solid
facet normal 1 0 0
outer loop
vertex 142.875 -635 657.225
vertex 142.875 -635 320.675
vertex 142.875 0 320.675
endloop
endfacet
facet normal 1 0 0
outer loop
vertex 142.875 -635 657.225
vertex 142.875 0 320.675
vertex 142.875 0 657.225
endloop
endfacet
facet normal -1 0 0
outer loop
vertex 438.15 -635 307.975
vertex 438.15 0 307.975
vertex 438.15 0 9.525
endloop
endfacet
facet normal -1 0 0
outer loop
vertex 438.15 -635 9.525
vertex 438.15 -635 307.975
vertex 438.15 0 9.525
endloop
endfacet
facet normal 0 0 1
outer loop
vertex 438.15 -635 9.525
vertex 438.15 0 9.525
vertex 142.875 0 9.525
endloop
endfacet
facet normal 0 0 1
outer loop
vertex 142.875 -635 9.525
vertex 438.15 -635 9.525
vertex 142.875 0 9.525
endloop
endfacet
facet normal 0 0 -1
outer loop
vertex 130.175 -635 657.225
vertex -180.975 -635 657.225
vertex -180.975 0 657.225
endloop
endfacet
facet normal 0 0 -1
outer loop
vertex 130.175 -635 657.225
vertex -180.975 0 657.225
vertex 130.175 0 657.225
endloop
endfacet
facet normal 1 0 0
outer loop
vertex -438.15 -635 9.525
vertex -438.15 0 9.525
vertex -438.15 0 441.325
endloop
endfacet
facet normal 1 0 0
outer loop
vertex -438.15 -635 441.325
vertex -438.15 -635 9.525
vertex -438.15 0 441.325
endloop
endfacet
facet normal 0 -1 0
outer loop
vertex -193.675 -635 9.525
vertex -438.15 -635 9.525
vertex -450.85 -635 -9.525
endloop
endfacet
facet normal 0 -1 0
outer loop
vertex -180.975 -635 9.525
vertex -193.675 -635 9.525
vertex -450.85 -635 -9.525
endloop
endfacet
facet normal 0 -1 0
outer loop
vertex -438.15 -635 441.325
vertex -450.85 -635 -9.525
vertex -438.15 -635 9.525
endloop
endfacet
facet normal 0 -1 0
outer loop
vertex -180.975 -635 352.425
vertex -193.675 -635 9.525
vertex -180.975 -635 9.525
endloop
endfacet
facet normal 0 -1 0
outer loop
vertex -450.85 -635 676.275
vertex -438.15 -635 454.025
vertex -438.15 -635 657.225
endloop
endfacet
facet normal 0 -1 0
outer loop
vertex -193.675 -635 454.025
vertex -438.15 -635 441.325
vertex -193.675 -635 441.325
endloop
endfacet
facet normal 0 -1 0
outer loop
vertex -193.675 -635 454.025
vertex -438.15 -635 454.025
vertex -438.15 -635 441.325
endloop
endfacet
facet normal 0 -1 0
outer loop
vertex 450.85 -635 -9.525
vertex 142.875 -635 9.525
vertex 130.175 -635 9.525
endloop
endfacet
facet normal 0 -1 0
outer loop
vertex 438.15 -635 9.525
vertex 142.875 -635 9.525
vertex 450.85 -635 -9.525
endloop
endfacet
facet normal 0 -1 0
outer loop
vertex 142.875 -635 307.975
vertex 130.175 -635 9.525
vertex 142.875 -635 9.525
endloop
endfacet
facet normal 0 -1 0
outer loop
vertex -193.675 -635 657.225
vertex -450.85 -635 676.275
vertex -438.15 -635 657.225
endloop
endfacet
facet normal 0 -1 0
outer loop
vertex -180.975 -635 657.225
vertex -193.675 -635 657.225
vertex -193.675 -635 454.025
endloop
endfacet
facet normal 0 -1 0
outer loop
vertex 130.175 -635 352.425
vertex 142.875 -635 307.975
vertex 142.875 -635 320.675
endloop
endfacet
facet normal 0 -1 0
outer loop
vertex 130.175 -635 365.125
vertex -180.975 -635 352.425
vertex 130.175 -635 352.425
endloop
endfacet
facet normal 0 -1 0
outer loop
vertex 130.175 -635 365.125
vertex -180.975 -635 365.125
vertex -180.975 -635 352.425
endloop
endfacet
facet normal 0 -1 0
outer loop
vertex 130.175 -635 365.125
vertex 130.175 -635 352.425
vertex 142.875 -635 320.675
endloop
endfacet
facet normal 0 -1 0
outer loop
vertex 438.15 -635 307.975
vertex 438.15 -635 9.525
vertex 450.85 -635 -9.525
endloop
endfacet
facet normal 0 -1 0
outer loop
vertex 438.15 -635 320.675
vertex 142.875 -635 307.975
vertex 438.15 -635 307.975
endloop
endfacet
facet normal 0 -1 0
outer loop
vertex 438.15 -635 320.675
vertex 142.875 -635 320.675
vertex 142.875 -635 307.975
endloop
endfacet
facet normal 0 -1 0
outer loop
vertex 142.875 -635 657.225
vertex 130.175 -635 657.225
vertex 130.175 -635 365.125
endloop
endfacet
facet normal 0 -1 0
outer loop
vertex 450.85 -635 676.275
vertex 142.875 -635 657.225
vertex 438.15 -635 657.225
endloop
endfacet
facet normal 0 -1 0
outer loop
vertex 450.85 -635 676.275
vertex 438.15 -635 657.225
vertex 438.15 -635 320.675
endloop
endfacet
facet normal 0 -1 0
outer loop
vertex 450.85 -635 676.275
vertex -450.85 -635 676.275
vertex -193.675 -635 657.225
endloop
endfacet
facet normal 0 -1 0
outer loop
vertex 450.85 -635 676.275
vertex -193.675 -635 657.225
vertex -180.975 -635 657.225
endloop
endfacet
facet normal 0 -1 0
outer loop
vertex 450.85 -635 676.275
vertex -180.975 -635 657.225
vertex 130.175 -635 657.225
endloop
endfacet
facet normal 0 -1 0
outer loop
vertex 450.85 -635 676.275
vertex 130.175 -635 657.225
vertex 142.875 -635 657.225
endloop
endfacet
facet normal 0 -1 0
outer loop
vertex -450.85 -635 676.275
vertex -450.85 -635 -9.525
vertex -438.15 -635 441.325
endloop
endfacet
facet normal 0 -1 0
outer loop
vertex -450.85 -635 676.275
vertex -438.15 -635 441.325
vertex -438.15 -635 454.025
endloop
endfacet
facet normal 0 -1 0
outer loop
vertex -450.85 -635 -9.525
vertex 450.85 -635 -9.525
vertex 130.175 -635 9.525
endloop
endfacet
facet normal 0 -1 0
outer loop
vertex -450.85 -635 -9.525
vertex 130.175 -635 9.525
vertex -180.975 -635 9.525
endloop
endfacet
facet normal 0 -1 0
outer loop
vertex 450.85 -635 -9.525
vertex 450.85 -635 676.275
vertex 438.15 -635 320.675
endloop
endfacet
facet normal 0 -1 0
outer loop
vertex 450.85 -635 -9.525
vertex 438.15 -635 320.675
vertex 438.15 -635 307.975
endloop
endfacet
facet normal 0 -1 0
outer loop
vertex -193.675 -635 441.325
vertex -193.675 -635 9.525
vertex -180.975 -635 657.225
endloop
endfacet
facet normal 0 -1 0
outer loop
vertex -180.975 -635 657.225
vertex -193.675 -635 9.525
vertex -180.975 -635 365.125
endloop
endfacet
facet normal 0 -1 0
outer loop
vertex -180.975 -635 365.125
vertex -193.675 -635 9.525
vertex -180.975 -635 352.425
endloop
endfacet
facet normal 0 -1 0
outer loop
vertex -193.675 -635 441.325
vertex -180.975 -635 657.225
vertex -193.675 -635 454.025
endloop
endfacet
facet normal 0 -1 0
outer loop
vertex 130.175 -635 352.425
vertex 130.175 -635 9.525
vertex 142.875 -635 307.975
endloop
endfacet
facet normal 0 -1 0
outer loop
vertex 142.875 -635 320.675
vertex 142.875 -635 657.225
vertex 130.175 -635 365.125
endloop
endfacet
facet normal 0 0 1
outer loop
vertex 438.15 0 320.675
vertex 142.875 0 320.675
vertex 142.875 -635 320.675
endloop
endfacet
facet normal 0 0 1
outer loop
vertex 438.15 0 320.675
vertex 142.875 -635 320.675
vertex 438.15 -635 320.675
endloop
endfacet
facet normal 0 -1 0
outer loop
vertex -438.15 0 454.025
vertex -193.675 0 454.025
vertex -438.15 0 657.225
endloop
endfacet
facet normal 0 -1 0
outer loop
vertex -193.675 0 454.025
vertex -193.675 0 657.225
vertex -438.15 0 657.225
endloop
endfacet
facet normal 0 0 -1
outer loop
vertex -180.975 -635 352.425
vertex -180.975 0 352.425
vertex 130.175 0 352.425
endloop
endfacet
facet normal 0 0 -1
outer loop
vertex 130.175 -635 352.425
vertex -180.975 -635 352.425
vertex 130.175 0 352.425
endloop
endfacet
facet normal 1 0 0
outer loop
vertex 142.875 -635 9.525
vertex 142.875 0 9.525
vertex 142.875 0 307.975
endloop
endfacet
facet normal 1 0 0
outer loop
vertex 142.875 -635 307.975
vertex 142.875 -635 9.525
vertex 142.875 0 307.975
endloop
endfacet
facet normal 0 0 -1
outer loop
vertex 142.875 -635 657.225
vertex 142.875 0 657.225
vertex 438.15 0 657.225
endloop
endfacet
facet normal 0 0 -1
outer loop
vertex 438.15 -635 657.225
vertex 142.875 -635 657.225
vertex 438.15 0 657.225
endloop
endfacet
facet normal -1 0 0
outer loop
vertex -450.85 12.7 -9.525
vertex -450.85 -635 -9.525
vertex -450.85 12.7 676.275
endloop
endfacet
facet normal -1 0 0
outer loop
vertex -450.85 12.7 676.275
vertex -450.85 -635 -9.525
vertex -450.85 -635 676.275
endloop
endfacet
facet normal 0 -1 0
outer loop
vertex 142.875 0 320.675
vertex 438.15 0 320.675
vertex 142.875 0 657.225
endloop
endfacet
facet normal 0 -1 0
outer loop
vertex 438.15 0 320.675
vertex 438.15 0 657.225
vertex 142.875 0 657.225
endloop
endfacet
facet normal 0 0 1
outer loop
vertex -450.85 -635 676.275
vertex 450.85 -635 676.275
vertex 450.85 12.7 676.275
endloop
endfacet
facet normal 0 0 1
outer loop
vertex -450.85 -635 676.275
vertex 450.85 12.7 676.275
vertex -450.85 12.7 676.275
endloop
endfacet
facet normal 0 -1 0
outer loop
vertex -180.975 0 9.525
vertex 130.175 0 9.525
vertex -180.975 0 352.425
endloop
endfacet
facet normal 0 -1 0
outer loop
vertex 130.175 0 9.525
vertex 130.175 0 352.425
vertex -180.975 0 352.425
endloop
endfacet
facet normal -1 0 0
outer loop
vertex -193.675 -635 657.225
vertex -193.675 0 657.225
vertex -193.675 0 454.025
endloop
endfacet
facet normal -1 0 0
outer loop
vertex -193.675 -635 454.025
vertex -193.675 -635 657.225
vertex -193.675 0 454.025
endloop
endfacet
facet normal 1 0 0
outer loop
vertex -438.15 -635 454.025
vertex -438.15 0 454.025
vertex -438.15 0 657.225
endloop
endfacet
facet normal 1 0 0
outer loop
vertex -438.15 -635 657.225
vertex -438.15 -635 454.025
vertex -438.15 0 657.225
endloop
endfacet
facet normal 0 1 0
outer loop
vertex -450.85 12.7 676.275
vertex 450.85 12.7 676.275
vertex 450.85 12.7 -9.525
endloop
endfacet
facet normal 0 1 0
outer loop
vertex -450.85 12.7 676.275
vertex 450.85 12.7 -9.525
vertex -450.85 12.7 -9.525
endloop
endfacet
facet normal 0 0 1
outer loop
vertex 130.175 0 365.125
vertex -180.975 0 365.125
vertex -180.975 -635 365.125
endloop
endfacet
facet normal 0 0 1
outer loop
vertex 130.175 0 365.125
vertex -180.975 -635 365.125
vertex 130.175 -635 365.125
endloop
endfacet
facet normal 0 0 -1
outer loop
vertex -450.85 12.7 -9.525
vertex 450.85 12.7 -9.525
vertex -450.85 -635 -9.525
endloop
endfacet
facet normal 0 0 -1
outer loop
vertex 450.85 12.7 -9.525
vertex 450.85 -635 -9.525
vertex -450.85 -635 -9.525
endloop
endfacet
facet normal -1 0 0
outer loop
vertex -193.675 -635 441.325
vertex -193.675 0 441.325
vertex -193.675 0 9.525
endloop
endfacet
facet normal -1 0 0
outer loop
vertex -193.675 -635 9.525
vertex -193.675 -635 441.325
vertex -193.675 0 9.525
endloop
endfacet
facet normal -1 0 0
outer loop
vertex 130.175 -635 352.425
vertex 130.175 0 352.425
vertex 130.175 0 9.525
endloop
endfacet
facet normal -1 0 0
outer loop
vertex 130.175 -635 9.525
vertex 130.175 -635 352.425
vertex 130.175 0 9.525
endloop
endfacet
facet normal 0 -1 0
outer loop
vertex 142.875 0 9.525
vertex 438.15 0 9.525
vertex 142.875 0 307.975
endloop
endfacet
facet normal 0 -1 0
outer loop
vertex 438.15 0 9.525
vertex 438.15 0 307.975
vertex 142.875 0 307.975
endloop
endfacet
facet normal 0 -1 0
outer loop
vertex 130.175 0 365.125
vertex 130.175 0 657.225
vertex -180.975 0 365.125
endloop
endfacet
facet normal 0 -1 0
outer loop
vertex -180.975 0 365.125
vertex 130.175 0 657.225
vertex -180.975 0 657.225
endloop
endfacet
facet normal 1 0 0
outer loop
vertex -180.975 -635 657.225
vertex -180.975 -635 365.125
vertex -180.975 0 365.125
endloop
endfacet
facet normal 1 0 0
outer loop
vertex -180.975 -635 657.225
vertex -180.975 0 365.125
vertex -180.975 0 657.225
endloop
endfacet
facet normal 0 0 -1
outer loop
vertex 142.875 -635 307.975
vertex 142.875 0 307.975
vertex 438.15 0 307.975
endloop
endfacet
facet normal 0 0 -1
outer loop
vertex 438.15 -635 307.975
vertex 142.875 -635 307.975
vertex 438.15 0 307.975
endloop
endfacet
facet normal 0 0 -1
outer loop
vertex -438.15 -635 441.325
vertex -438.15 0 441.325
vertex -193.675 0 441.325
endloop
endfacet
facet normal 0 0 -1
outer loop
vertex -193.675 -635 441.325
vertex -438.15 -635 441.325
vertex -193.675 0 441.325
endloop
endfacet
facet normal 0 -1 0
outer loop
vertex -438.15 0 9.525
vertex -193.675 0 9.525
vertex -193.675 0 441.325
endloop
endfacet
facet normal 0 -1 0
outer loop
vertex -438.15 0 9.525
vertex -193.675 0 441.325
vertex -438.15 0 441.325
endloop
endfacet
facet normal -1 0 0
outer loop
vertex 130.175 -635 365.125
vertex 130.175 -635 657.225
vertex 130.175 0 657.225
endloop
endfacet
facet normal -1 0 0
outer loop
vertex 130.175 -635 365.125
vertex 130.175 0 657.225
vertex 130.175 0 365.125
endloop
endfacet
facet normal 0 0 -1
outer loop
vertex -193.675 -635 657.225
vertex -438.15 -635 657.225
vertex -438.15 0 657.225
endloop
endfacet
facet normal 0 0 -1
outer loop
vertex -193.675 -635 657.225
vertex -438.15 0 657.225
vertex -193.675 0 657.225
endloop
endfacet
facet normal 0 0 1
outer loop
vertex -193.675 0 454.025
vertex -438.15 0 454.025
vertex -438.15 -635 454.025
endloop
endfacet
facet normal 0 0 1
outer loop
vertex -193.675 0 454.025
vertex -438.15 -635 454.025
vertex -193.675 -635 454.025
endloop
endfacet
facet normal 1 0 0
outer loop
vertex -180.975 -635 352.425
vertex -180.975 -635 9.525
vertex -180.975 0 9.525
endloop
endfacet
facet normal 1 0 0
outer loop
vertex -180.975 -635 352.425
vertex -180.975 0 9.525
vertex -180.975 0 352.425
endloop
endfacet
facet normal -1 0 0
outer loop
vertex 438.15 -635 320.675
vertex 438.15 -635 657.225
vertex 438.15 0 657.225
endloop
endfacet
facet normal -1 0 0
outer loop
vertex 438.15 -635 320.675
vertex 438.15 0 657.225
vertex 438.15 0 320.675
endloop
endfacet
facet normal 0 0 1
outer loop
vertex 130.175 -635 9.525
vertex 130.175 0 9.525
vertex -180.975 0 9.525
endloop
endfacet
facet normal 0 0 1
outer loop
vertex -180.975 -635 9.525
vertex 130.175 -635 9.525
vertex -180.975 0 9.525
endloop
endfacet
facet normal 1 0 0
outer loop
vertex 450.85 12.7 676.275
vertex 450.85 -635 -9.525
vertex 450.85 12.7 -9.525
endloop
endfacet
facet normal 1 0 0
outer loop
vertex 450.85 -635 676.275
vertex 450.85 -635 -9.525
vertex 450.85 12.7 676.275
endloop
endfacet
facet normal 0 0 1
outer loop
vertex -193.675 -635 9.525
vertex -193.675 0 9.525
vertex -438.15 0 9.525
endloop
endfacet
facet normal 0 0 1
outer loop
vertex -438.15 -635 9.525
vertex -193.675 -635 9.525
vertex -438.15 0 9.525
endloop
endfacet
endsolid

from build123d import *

# Parameters (mm, degrees)
F0_W     = 244.475
F0_H     = 12.7
F0_W_2   = 311.15
F0_W_3   = 295.275
F1_DEPTH = 635
F2_W     = 901.7
F2_H     = 685.8
F3_DEPTH = 12.7


with BuildPart() as f1:
    # F0 (on Front) → F1 (new body)
    with BuildSketch(Plane.XZ):
        Polygon((-450.85, 657.225), (-450.85, 9.525), (-438.15, 9.525), (-438.15, 441.325), (-438.15, 454.025), (-438.15, 657.225), align=None)
        Polygon((438.15, 657.225), (450.85, 657.225), (450.85, 676.275), (-450.85, 676.275), (-450.85, 657.225), (-438.15, 657.225), (-193.675, 657.225), (-180.975, 657.225), (130.175, 657.225), (142.875, 657.225), align=None)
        Polygon((-193.675, 9.525), (-180.975, 9.525), (-180.975, 352.425), (-180.975, 365.125), (-180.975, 657.225), (-193.675, 657.225), (-193.675, 454.025), (-193.675, 441.325), align=None)
        with Locations((-315.9125, 447.675)):
            Rectangle(F0_W, F0_H)
        with Locations((-25.4, 358.775)):
            Rectangle(F0_W_2, F0_H)
        Polygon((130.175, 9.525), (142.875, 9.525), (142.875, 307.975), (142.875, 320.675), (142.875, 657.225), (130.175, 657.225), (130.175, 365.125), (130.175, 352.425), align=None)
        with Locations((290.5125, 314.325)):
            Rectangle(F0_W_3, F0_H)
        Polygon((438.15, 9.525), (450.85, 9.525), (450.85, 657.225), (438.15, 657.225), (438.15, 320.675), (438.15, 307.975), align=None)
        Polygon((450.85, -9.525), (450.85, 9.525), (438.15, 9.525), (142.875, 9.525), (130.175, 9.525), (-180.975, 9.525), (-193.675, 9.525), (-438.15, 9.525), (-450.85, 9.525), (-450.85, -9.525), align=None)
    extrude(amount=F1_DEPTH)

    # F2 (on face) → F3 (join)
    with BuildSketch(Plane(origin=(0, 0, 0), x_dir=(-1, 0, 0), z_dir=(0, 1, 0))):
        with Locations((0, 333.375)):
            Rectangle(F2_W, F2_H)
    extrude(amount=F3_DEPTH)


solid = f1.part
